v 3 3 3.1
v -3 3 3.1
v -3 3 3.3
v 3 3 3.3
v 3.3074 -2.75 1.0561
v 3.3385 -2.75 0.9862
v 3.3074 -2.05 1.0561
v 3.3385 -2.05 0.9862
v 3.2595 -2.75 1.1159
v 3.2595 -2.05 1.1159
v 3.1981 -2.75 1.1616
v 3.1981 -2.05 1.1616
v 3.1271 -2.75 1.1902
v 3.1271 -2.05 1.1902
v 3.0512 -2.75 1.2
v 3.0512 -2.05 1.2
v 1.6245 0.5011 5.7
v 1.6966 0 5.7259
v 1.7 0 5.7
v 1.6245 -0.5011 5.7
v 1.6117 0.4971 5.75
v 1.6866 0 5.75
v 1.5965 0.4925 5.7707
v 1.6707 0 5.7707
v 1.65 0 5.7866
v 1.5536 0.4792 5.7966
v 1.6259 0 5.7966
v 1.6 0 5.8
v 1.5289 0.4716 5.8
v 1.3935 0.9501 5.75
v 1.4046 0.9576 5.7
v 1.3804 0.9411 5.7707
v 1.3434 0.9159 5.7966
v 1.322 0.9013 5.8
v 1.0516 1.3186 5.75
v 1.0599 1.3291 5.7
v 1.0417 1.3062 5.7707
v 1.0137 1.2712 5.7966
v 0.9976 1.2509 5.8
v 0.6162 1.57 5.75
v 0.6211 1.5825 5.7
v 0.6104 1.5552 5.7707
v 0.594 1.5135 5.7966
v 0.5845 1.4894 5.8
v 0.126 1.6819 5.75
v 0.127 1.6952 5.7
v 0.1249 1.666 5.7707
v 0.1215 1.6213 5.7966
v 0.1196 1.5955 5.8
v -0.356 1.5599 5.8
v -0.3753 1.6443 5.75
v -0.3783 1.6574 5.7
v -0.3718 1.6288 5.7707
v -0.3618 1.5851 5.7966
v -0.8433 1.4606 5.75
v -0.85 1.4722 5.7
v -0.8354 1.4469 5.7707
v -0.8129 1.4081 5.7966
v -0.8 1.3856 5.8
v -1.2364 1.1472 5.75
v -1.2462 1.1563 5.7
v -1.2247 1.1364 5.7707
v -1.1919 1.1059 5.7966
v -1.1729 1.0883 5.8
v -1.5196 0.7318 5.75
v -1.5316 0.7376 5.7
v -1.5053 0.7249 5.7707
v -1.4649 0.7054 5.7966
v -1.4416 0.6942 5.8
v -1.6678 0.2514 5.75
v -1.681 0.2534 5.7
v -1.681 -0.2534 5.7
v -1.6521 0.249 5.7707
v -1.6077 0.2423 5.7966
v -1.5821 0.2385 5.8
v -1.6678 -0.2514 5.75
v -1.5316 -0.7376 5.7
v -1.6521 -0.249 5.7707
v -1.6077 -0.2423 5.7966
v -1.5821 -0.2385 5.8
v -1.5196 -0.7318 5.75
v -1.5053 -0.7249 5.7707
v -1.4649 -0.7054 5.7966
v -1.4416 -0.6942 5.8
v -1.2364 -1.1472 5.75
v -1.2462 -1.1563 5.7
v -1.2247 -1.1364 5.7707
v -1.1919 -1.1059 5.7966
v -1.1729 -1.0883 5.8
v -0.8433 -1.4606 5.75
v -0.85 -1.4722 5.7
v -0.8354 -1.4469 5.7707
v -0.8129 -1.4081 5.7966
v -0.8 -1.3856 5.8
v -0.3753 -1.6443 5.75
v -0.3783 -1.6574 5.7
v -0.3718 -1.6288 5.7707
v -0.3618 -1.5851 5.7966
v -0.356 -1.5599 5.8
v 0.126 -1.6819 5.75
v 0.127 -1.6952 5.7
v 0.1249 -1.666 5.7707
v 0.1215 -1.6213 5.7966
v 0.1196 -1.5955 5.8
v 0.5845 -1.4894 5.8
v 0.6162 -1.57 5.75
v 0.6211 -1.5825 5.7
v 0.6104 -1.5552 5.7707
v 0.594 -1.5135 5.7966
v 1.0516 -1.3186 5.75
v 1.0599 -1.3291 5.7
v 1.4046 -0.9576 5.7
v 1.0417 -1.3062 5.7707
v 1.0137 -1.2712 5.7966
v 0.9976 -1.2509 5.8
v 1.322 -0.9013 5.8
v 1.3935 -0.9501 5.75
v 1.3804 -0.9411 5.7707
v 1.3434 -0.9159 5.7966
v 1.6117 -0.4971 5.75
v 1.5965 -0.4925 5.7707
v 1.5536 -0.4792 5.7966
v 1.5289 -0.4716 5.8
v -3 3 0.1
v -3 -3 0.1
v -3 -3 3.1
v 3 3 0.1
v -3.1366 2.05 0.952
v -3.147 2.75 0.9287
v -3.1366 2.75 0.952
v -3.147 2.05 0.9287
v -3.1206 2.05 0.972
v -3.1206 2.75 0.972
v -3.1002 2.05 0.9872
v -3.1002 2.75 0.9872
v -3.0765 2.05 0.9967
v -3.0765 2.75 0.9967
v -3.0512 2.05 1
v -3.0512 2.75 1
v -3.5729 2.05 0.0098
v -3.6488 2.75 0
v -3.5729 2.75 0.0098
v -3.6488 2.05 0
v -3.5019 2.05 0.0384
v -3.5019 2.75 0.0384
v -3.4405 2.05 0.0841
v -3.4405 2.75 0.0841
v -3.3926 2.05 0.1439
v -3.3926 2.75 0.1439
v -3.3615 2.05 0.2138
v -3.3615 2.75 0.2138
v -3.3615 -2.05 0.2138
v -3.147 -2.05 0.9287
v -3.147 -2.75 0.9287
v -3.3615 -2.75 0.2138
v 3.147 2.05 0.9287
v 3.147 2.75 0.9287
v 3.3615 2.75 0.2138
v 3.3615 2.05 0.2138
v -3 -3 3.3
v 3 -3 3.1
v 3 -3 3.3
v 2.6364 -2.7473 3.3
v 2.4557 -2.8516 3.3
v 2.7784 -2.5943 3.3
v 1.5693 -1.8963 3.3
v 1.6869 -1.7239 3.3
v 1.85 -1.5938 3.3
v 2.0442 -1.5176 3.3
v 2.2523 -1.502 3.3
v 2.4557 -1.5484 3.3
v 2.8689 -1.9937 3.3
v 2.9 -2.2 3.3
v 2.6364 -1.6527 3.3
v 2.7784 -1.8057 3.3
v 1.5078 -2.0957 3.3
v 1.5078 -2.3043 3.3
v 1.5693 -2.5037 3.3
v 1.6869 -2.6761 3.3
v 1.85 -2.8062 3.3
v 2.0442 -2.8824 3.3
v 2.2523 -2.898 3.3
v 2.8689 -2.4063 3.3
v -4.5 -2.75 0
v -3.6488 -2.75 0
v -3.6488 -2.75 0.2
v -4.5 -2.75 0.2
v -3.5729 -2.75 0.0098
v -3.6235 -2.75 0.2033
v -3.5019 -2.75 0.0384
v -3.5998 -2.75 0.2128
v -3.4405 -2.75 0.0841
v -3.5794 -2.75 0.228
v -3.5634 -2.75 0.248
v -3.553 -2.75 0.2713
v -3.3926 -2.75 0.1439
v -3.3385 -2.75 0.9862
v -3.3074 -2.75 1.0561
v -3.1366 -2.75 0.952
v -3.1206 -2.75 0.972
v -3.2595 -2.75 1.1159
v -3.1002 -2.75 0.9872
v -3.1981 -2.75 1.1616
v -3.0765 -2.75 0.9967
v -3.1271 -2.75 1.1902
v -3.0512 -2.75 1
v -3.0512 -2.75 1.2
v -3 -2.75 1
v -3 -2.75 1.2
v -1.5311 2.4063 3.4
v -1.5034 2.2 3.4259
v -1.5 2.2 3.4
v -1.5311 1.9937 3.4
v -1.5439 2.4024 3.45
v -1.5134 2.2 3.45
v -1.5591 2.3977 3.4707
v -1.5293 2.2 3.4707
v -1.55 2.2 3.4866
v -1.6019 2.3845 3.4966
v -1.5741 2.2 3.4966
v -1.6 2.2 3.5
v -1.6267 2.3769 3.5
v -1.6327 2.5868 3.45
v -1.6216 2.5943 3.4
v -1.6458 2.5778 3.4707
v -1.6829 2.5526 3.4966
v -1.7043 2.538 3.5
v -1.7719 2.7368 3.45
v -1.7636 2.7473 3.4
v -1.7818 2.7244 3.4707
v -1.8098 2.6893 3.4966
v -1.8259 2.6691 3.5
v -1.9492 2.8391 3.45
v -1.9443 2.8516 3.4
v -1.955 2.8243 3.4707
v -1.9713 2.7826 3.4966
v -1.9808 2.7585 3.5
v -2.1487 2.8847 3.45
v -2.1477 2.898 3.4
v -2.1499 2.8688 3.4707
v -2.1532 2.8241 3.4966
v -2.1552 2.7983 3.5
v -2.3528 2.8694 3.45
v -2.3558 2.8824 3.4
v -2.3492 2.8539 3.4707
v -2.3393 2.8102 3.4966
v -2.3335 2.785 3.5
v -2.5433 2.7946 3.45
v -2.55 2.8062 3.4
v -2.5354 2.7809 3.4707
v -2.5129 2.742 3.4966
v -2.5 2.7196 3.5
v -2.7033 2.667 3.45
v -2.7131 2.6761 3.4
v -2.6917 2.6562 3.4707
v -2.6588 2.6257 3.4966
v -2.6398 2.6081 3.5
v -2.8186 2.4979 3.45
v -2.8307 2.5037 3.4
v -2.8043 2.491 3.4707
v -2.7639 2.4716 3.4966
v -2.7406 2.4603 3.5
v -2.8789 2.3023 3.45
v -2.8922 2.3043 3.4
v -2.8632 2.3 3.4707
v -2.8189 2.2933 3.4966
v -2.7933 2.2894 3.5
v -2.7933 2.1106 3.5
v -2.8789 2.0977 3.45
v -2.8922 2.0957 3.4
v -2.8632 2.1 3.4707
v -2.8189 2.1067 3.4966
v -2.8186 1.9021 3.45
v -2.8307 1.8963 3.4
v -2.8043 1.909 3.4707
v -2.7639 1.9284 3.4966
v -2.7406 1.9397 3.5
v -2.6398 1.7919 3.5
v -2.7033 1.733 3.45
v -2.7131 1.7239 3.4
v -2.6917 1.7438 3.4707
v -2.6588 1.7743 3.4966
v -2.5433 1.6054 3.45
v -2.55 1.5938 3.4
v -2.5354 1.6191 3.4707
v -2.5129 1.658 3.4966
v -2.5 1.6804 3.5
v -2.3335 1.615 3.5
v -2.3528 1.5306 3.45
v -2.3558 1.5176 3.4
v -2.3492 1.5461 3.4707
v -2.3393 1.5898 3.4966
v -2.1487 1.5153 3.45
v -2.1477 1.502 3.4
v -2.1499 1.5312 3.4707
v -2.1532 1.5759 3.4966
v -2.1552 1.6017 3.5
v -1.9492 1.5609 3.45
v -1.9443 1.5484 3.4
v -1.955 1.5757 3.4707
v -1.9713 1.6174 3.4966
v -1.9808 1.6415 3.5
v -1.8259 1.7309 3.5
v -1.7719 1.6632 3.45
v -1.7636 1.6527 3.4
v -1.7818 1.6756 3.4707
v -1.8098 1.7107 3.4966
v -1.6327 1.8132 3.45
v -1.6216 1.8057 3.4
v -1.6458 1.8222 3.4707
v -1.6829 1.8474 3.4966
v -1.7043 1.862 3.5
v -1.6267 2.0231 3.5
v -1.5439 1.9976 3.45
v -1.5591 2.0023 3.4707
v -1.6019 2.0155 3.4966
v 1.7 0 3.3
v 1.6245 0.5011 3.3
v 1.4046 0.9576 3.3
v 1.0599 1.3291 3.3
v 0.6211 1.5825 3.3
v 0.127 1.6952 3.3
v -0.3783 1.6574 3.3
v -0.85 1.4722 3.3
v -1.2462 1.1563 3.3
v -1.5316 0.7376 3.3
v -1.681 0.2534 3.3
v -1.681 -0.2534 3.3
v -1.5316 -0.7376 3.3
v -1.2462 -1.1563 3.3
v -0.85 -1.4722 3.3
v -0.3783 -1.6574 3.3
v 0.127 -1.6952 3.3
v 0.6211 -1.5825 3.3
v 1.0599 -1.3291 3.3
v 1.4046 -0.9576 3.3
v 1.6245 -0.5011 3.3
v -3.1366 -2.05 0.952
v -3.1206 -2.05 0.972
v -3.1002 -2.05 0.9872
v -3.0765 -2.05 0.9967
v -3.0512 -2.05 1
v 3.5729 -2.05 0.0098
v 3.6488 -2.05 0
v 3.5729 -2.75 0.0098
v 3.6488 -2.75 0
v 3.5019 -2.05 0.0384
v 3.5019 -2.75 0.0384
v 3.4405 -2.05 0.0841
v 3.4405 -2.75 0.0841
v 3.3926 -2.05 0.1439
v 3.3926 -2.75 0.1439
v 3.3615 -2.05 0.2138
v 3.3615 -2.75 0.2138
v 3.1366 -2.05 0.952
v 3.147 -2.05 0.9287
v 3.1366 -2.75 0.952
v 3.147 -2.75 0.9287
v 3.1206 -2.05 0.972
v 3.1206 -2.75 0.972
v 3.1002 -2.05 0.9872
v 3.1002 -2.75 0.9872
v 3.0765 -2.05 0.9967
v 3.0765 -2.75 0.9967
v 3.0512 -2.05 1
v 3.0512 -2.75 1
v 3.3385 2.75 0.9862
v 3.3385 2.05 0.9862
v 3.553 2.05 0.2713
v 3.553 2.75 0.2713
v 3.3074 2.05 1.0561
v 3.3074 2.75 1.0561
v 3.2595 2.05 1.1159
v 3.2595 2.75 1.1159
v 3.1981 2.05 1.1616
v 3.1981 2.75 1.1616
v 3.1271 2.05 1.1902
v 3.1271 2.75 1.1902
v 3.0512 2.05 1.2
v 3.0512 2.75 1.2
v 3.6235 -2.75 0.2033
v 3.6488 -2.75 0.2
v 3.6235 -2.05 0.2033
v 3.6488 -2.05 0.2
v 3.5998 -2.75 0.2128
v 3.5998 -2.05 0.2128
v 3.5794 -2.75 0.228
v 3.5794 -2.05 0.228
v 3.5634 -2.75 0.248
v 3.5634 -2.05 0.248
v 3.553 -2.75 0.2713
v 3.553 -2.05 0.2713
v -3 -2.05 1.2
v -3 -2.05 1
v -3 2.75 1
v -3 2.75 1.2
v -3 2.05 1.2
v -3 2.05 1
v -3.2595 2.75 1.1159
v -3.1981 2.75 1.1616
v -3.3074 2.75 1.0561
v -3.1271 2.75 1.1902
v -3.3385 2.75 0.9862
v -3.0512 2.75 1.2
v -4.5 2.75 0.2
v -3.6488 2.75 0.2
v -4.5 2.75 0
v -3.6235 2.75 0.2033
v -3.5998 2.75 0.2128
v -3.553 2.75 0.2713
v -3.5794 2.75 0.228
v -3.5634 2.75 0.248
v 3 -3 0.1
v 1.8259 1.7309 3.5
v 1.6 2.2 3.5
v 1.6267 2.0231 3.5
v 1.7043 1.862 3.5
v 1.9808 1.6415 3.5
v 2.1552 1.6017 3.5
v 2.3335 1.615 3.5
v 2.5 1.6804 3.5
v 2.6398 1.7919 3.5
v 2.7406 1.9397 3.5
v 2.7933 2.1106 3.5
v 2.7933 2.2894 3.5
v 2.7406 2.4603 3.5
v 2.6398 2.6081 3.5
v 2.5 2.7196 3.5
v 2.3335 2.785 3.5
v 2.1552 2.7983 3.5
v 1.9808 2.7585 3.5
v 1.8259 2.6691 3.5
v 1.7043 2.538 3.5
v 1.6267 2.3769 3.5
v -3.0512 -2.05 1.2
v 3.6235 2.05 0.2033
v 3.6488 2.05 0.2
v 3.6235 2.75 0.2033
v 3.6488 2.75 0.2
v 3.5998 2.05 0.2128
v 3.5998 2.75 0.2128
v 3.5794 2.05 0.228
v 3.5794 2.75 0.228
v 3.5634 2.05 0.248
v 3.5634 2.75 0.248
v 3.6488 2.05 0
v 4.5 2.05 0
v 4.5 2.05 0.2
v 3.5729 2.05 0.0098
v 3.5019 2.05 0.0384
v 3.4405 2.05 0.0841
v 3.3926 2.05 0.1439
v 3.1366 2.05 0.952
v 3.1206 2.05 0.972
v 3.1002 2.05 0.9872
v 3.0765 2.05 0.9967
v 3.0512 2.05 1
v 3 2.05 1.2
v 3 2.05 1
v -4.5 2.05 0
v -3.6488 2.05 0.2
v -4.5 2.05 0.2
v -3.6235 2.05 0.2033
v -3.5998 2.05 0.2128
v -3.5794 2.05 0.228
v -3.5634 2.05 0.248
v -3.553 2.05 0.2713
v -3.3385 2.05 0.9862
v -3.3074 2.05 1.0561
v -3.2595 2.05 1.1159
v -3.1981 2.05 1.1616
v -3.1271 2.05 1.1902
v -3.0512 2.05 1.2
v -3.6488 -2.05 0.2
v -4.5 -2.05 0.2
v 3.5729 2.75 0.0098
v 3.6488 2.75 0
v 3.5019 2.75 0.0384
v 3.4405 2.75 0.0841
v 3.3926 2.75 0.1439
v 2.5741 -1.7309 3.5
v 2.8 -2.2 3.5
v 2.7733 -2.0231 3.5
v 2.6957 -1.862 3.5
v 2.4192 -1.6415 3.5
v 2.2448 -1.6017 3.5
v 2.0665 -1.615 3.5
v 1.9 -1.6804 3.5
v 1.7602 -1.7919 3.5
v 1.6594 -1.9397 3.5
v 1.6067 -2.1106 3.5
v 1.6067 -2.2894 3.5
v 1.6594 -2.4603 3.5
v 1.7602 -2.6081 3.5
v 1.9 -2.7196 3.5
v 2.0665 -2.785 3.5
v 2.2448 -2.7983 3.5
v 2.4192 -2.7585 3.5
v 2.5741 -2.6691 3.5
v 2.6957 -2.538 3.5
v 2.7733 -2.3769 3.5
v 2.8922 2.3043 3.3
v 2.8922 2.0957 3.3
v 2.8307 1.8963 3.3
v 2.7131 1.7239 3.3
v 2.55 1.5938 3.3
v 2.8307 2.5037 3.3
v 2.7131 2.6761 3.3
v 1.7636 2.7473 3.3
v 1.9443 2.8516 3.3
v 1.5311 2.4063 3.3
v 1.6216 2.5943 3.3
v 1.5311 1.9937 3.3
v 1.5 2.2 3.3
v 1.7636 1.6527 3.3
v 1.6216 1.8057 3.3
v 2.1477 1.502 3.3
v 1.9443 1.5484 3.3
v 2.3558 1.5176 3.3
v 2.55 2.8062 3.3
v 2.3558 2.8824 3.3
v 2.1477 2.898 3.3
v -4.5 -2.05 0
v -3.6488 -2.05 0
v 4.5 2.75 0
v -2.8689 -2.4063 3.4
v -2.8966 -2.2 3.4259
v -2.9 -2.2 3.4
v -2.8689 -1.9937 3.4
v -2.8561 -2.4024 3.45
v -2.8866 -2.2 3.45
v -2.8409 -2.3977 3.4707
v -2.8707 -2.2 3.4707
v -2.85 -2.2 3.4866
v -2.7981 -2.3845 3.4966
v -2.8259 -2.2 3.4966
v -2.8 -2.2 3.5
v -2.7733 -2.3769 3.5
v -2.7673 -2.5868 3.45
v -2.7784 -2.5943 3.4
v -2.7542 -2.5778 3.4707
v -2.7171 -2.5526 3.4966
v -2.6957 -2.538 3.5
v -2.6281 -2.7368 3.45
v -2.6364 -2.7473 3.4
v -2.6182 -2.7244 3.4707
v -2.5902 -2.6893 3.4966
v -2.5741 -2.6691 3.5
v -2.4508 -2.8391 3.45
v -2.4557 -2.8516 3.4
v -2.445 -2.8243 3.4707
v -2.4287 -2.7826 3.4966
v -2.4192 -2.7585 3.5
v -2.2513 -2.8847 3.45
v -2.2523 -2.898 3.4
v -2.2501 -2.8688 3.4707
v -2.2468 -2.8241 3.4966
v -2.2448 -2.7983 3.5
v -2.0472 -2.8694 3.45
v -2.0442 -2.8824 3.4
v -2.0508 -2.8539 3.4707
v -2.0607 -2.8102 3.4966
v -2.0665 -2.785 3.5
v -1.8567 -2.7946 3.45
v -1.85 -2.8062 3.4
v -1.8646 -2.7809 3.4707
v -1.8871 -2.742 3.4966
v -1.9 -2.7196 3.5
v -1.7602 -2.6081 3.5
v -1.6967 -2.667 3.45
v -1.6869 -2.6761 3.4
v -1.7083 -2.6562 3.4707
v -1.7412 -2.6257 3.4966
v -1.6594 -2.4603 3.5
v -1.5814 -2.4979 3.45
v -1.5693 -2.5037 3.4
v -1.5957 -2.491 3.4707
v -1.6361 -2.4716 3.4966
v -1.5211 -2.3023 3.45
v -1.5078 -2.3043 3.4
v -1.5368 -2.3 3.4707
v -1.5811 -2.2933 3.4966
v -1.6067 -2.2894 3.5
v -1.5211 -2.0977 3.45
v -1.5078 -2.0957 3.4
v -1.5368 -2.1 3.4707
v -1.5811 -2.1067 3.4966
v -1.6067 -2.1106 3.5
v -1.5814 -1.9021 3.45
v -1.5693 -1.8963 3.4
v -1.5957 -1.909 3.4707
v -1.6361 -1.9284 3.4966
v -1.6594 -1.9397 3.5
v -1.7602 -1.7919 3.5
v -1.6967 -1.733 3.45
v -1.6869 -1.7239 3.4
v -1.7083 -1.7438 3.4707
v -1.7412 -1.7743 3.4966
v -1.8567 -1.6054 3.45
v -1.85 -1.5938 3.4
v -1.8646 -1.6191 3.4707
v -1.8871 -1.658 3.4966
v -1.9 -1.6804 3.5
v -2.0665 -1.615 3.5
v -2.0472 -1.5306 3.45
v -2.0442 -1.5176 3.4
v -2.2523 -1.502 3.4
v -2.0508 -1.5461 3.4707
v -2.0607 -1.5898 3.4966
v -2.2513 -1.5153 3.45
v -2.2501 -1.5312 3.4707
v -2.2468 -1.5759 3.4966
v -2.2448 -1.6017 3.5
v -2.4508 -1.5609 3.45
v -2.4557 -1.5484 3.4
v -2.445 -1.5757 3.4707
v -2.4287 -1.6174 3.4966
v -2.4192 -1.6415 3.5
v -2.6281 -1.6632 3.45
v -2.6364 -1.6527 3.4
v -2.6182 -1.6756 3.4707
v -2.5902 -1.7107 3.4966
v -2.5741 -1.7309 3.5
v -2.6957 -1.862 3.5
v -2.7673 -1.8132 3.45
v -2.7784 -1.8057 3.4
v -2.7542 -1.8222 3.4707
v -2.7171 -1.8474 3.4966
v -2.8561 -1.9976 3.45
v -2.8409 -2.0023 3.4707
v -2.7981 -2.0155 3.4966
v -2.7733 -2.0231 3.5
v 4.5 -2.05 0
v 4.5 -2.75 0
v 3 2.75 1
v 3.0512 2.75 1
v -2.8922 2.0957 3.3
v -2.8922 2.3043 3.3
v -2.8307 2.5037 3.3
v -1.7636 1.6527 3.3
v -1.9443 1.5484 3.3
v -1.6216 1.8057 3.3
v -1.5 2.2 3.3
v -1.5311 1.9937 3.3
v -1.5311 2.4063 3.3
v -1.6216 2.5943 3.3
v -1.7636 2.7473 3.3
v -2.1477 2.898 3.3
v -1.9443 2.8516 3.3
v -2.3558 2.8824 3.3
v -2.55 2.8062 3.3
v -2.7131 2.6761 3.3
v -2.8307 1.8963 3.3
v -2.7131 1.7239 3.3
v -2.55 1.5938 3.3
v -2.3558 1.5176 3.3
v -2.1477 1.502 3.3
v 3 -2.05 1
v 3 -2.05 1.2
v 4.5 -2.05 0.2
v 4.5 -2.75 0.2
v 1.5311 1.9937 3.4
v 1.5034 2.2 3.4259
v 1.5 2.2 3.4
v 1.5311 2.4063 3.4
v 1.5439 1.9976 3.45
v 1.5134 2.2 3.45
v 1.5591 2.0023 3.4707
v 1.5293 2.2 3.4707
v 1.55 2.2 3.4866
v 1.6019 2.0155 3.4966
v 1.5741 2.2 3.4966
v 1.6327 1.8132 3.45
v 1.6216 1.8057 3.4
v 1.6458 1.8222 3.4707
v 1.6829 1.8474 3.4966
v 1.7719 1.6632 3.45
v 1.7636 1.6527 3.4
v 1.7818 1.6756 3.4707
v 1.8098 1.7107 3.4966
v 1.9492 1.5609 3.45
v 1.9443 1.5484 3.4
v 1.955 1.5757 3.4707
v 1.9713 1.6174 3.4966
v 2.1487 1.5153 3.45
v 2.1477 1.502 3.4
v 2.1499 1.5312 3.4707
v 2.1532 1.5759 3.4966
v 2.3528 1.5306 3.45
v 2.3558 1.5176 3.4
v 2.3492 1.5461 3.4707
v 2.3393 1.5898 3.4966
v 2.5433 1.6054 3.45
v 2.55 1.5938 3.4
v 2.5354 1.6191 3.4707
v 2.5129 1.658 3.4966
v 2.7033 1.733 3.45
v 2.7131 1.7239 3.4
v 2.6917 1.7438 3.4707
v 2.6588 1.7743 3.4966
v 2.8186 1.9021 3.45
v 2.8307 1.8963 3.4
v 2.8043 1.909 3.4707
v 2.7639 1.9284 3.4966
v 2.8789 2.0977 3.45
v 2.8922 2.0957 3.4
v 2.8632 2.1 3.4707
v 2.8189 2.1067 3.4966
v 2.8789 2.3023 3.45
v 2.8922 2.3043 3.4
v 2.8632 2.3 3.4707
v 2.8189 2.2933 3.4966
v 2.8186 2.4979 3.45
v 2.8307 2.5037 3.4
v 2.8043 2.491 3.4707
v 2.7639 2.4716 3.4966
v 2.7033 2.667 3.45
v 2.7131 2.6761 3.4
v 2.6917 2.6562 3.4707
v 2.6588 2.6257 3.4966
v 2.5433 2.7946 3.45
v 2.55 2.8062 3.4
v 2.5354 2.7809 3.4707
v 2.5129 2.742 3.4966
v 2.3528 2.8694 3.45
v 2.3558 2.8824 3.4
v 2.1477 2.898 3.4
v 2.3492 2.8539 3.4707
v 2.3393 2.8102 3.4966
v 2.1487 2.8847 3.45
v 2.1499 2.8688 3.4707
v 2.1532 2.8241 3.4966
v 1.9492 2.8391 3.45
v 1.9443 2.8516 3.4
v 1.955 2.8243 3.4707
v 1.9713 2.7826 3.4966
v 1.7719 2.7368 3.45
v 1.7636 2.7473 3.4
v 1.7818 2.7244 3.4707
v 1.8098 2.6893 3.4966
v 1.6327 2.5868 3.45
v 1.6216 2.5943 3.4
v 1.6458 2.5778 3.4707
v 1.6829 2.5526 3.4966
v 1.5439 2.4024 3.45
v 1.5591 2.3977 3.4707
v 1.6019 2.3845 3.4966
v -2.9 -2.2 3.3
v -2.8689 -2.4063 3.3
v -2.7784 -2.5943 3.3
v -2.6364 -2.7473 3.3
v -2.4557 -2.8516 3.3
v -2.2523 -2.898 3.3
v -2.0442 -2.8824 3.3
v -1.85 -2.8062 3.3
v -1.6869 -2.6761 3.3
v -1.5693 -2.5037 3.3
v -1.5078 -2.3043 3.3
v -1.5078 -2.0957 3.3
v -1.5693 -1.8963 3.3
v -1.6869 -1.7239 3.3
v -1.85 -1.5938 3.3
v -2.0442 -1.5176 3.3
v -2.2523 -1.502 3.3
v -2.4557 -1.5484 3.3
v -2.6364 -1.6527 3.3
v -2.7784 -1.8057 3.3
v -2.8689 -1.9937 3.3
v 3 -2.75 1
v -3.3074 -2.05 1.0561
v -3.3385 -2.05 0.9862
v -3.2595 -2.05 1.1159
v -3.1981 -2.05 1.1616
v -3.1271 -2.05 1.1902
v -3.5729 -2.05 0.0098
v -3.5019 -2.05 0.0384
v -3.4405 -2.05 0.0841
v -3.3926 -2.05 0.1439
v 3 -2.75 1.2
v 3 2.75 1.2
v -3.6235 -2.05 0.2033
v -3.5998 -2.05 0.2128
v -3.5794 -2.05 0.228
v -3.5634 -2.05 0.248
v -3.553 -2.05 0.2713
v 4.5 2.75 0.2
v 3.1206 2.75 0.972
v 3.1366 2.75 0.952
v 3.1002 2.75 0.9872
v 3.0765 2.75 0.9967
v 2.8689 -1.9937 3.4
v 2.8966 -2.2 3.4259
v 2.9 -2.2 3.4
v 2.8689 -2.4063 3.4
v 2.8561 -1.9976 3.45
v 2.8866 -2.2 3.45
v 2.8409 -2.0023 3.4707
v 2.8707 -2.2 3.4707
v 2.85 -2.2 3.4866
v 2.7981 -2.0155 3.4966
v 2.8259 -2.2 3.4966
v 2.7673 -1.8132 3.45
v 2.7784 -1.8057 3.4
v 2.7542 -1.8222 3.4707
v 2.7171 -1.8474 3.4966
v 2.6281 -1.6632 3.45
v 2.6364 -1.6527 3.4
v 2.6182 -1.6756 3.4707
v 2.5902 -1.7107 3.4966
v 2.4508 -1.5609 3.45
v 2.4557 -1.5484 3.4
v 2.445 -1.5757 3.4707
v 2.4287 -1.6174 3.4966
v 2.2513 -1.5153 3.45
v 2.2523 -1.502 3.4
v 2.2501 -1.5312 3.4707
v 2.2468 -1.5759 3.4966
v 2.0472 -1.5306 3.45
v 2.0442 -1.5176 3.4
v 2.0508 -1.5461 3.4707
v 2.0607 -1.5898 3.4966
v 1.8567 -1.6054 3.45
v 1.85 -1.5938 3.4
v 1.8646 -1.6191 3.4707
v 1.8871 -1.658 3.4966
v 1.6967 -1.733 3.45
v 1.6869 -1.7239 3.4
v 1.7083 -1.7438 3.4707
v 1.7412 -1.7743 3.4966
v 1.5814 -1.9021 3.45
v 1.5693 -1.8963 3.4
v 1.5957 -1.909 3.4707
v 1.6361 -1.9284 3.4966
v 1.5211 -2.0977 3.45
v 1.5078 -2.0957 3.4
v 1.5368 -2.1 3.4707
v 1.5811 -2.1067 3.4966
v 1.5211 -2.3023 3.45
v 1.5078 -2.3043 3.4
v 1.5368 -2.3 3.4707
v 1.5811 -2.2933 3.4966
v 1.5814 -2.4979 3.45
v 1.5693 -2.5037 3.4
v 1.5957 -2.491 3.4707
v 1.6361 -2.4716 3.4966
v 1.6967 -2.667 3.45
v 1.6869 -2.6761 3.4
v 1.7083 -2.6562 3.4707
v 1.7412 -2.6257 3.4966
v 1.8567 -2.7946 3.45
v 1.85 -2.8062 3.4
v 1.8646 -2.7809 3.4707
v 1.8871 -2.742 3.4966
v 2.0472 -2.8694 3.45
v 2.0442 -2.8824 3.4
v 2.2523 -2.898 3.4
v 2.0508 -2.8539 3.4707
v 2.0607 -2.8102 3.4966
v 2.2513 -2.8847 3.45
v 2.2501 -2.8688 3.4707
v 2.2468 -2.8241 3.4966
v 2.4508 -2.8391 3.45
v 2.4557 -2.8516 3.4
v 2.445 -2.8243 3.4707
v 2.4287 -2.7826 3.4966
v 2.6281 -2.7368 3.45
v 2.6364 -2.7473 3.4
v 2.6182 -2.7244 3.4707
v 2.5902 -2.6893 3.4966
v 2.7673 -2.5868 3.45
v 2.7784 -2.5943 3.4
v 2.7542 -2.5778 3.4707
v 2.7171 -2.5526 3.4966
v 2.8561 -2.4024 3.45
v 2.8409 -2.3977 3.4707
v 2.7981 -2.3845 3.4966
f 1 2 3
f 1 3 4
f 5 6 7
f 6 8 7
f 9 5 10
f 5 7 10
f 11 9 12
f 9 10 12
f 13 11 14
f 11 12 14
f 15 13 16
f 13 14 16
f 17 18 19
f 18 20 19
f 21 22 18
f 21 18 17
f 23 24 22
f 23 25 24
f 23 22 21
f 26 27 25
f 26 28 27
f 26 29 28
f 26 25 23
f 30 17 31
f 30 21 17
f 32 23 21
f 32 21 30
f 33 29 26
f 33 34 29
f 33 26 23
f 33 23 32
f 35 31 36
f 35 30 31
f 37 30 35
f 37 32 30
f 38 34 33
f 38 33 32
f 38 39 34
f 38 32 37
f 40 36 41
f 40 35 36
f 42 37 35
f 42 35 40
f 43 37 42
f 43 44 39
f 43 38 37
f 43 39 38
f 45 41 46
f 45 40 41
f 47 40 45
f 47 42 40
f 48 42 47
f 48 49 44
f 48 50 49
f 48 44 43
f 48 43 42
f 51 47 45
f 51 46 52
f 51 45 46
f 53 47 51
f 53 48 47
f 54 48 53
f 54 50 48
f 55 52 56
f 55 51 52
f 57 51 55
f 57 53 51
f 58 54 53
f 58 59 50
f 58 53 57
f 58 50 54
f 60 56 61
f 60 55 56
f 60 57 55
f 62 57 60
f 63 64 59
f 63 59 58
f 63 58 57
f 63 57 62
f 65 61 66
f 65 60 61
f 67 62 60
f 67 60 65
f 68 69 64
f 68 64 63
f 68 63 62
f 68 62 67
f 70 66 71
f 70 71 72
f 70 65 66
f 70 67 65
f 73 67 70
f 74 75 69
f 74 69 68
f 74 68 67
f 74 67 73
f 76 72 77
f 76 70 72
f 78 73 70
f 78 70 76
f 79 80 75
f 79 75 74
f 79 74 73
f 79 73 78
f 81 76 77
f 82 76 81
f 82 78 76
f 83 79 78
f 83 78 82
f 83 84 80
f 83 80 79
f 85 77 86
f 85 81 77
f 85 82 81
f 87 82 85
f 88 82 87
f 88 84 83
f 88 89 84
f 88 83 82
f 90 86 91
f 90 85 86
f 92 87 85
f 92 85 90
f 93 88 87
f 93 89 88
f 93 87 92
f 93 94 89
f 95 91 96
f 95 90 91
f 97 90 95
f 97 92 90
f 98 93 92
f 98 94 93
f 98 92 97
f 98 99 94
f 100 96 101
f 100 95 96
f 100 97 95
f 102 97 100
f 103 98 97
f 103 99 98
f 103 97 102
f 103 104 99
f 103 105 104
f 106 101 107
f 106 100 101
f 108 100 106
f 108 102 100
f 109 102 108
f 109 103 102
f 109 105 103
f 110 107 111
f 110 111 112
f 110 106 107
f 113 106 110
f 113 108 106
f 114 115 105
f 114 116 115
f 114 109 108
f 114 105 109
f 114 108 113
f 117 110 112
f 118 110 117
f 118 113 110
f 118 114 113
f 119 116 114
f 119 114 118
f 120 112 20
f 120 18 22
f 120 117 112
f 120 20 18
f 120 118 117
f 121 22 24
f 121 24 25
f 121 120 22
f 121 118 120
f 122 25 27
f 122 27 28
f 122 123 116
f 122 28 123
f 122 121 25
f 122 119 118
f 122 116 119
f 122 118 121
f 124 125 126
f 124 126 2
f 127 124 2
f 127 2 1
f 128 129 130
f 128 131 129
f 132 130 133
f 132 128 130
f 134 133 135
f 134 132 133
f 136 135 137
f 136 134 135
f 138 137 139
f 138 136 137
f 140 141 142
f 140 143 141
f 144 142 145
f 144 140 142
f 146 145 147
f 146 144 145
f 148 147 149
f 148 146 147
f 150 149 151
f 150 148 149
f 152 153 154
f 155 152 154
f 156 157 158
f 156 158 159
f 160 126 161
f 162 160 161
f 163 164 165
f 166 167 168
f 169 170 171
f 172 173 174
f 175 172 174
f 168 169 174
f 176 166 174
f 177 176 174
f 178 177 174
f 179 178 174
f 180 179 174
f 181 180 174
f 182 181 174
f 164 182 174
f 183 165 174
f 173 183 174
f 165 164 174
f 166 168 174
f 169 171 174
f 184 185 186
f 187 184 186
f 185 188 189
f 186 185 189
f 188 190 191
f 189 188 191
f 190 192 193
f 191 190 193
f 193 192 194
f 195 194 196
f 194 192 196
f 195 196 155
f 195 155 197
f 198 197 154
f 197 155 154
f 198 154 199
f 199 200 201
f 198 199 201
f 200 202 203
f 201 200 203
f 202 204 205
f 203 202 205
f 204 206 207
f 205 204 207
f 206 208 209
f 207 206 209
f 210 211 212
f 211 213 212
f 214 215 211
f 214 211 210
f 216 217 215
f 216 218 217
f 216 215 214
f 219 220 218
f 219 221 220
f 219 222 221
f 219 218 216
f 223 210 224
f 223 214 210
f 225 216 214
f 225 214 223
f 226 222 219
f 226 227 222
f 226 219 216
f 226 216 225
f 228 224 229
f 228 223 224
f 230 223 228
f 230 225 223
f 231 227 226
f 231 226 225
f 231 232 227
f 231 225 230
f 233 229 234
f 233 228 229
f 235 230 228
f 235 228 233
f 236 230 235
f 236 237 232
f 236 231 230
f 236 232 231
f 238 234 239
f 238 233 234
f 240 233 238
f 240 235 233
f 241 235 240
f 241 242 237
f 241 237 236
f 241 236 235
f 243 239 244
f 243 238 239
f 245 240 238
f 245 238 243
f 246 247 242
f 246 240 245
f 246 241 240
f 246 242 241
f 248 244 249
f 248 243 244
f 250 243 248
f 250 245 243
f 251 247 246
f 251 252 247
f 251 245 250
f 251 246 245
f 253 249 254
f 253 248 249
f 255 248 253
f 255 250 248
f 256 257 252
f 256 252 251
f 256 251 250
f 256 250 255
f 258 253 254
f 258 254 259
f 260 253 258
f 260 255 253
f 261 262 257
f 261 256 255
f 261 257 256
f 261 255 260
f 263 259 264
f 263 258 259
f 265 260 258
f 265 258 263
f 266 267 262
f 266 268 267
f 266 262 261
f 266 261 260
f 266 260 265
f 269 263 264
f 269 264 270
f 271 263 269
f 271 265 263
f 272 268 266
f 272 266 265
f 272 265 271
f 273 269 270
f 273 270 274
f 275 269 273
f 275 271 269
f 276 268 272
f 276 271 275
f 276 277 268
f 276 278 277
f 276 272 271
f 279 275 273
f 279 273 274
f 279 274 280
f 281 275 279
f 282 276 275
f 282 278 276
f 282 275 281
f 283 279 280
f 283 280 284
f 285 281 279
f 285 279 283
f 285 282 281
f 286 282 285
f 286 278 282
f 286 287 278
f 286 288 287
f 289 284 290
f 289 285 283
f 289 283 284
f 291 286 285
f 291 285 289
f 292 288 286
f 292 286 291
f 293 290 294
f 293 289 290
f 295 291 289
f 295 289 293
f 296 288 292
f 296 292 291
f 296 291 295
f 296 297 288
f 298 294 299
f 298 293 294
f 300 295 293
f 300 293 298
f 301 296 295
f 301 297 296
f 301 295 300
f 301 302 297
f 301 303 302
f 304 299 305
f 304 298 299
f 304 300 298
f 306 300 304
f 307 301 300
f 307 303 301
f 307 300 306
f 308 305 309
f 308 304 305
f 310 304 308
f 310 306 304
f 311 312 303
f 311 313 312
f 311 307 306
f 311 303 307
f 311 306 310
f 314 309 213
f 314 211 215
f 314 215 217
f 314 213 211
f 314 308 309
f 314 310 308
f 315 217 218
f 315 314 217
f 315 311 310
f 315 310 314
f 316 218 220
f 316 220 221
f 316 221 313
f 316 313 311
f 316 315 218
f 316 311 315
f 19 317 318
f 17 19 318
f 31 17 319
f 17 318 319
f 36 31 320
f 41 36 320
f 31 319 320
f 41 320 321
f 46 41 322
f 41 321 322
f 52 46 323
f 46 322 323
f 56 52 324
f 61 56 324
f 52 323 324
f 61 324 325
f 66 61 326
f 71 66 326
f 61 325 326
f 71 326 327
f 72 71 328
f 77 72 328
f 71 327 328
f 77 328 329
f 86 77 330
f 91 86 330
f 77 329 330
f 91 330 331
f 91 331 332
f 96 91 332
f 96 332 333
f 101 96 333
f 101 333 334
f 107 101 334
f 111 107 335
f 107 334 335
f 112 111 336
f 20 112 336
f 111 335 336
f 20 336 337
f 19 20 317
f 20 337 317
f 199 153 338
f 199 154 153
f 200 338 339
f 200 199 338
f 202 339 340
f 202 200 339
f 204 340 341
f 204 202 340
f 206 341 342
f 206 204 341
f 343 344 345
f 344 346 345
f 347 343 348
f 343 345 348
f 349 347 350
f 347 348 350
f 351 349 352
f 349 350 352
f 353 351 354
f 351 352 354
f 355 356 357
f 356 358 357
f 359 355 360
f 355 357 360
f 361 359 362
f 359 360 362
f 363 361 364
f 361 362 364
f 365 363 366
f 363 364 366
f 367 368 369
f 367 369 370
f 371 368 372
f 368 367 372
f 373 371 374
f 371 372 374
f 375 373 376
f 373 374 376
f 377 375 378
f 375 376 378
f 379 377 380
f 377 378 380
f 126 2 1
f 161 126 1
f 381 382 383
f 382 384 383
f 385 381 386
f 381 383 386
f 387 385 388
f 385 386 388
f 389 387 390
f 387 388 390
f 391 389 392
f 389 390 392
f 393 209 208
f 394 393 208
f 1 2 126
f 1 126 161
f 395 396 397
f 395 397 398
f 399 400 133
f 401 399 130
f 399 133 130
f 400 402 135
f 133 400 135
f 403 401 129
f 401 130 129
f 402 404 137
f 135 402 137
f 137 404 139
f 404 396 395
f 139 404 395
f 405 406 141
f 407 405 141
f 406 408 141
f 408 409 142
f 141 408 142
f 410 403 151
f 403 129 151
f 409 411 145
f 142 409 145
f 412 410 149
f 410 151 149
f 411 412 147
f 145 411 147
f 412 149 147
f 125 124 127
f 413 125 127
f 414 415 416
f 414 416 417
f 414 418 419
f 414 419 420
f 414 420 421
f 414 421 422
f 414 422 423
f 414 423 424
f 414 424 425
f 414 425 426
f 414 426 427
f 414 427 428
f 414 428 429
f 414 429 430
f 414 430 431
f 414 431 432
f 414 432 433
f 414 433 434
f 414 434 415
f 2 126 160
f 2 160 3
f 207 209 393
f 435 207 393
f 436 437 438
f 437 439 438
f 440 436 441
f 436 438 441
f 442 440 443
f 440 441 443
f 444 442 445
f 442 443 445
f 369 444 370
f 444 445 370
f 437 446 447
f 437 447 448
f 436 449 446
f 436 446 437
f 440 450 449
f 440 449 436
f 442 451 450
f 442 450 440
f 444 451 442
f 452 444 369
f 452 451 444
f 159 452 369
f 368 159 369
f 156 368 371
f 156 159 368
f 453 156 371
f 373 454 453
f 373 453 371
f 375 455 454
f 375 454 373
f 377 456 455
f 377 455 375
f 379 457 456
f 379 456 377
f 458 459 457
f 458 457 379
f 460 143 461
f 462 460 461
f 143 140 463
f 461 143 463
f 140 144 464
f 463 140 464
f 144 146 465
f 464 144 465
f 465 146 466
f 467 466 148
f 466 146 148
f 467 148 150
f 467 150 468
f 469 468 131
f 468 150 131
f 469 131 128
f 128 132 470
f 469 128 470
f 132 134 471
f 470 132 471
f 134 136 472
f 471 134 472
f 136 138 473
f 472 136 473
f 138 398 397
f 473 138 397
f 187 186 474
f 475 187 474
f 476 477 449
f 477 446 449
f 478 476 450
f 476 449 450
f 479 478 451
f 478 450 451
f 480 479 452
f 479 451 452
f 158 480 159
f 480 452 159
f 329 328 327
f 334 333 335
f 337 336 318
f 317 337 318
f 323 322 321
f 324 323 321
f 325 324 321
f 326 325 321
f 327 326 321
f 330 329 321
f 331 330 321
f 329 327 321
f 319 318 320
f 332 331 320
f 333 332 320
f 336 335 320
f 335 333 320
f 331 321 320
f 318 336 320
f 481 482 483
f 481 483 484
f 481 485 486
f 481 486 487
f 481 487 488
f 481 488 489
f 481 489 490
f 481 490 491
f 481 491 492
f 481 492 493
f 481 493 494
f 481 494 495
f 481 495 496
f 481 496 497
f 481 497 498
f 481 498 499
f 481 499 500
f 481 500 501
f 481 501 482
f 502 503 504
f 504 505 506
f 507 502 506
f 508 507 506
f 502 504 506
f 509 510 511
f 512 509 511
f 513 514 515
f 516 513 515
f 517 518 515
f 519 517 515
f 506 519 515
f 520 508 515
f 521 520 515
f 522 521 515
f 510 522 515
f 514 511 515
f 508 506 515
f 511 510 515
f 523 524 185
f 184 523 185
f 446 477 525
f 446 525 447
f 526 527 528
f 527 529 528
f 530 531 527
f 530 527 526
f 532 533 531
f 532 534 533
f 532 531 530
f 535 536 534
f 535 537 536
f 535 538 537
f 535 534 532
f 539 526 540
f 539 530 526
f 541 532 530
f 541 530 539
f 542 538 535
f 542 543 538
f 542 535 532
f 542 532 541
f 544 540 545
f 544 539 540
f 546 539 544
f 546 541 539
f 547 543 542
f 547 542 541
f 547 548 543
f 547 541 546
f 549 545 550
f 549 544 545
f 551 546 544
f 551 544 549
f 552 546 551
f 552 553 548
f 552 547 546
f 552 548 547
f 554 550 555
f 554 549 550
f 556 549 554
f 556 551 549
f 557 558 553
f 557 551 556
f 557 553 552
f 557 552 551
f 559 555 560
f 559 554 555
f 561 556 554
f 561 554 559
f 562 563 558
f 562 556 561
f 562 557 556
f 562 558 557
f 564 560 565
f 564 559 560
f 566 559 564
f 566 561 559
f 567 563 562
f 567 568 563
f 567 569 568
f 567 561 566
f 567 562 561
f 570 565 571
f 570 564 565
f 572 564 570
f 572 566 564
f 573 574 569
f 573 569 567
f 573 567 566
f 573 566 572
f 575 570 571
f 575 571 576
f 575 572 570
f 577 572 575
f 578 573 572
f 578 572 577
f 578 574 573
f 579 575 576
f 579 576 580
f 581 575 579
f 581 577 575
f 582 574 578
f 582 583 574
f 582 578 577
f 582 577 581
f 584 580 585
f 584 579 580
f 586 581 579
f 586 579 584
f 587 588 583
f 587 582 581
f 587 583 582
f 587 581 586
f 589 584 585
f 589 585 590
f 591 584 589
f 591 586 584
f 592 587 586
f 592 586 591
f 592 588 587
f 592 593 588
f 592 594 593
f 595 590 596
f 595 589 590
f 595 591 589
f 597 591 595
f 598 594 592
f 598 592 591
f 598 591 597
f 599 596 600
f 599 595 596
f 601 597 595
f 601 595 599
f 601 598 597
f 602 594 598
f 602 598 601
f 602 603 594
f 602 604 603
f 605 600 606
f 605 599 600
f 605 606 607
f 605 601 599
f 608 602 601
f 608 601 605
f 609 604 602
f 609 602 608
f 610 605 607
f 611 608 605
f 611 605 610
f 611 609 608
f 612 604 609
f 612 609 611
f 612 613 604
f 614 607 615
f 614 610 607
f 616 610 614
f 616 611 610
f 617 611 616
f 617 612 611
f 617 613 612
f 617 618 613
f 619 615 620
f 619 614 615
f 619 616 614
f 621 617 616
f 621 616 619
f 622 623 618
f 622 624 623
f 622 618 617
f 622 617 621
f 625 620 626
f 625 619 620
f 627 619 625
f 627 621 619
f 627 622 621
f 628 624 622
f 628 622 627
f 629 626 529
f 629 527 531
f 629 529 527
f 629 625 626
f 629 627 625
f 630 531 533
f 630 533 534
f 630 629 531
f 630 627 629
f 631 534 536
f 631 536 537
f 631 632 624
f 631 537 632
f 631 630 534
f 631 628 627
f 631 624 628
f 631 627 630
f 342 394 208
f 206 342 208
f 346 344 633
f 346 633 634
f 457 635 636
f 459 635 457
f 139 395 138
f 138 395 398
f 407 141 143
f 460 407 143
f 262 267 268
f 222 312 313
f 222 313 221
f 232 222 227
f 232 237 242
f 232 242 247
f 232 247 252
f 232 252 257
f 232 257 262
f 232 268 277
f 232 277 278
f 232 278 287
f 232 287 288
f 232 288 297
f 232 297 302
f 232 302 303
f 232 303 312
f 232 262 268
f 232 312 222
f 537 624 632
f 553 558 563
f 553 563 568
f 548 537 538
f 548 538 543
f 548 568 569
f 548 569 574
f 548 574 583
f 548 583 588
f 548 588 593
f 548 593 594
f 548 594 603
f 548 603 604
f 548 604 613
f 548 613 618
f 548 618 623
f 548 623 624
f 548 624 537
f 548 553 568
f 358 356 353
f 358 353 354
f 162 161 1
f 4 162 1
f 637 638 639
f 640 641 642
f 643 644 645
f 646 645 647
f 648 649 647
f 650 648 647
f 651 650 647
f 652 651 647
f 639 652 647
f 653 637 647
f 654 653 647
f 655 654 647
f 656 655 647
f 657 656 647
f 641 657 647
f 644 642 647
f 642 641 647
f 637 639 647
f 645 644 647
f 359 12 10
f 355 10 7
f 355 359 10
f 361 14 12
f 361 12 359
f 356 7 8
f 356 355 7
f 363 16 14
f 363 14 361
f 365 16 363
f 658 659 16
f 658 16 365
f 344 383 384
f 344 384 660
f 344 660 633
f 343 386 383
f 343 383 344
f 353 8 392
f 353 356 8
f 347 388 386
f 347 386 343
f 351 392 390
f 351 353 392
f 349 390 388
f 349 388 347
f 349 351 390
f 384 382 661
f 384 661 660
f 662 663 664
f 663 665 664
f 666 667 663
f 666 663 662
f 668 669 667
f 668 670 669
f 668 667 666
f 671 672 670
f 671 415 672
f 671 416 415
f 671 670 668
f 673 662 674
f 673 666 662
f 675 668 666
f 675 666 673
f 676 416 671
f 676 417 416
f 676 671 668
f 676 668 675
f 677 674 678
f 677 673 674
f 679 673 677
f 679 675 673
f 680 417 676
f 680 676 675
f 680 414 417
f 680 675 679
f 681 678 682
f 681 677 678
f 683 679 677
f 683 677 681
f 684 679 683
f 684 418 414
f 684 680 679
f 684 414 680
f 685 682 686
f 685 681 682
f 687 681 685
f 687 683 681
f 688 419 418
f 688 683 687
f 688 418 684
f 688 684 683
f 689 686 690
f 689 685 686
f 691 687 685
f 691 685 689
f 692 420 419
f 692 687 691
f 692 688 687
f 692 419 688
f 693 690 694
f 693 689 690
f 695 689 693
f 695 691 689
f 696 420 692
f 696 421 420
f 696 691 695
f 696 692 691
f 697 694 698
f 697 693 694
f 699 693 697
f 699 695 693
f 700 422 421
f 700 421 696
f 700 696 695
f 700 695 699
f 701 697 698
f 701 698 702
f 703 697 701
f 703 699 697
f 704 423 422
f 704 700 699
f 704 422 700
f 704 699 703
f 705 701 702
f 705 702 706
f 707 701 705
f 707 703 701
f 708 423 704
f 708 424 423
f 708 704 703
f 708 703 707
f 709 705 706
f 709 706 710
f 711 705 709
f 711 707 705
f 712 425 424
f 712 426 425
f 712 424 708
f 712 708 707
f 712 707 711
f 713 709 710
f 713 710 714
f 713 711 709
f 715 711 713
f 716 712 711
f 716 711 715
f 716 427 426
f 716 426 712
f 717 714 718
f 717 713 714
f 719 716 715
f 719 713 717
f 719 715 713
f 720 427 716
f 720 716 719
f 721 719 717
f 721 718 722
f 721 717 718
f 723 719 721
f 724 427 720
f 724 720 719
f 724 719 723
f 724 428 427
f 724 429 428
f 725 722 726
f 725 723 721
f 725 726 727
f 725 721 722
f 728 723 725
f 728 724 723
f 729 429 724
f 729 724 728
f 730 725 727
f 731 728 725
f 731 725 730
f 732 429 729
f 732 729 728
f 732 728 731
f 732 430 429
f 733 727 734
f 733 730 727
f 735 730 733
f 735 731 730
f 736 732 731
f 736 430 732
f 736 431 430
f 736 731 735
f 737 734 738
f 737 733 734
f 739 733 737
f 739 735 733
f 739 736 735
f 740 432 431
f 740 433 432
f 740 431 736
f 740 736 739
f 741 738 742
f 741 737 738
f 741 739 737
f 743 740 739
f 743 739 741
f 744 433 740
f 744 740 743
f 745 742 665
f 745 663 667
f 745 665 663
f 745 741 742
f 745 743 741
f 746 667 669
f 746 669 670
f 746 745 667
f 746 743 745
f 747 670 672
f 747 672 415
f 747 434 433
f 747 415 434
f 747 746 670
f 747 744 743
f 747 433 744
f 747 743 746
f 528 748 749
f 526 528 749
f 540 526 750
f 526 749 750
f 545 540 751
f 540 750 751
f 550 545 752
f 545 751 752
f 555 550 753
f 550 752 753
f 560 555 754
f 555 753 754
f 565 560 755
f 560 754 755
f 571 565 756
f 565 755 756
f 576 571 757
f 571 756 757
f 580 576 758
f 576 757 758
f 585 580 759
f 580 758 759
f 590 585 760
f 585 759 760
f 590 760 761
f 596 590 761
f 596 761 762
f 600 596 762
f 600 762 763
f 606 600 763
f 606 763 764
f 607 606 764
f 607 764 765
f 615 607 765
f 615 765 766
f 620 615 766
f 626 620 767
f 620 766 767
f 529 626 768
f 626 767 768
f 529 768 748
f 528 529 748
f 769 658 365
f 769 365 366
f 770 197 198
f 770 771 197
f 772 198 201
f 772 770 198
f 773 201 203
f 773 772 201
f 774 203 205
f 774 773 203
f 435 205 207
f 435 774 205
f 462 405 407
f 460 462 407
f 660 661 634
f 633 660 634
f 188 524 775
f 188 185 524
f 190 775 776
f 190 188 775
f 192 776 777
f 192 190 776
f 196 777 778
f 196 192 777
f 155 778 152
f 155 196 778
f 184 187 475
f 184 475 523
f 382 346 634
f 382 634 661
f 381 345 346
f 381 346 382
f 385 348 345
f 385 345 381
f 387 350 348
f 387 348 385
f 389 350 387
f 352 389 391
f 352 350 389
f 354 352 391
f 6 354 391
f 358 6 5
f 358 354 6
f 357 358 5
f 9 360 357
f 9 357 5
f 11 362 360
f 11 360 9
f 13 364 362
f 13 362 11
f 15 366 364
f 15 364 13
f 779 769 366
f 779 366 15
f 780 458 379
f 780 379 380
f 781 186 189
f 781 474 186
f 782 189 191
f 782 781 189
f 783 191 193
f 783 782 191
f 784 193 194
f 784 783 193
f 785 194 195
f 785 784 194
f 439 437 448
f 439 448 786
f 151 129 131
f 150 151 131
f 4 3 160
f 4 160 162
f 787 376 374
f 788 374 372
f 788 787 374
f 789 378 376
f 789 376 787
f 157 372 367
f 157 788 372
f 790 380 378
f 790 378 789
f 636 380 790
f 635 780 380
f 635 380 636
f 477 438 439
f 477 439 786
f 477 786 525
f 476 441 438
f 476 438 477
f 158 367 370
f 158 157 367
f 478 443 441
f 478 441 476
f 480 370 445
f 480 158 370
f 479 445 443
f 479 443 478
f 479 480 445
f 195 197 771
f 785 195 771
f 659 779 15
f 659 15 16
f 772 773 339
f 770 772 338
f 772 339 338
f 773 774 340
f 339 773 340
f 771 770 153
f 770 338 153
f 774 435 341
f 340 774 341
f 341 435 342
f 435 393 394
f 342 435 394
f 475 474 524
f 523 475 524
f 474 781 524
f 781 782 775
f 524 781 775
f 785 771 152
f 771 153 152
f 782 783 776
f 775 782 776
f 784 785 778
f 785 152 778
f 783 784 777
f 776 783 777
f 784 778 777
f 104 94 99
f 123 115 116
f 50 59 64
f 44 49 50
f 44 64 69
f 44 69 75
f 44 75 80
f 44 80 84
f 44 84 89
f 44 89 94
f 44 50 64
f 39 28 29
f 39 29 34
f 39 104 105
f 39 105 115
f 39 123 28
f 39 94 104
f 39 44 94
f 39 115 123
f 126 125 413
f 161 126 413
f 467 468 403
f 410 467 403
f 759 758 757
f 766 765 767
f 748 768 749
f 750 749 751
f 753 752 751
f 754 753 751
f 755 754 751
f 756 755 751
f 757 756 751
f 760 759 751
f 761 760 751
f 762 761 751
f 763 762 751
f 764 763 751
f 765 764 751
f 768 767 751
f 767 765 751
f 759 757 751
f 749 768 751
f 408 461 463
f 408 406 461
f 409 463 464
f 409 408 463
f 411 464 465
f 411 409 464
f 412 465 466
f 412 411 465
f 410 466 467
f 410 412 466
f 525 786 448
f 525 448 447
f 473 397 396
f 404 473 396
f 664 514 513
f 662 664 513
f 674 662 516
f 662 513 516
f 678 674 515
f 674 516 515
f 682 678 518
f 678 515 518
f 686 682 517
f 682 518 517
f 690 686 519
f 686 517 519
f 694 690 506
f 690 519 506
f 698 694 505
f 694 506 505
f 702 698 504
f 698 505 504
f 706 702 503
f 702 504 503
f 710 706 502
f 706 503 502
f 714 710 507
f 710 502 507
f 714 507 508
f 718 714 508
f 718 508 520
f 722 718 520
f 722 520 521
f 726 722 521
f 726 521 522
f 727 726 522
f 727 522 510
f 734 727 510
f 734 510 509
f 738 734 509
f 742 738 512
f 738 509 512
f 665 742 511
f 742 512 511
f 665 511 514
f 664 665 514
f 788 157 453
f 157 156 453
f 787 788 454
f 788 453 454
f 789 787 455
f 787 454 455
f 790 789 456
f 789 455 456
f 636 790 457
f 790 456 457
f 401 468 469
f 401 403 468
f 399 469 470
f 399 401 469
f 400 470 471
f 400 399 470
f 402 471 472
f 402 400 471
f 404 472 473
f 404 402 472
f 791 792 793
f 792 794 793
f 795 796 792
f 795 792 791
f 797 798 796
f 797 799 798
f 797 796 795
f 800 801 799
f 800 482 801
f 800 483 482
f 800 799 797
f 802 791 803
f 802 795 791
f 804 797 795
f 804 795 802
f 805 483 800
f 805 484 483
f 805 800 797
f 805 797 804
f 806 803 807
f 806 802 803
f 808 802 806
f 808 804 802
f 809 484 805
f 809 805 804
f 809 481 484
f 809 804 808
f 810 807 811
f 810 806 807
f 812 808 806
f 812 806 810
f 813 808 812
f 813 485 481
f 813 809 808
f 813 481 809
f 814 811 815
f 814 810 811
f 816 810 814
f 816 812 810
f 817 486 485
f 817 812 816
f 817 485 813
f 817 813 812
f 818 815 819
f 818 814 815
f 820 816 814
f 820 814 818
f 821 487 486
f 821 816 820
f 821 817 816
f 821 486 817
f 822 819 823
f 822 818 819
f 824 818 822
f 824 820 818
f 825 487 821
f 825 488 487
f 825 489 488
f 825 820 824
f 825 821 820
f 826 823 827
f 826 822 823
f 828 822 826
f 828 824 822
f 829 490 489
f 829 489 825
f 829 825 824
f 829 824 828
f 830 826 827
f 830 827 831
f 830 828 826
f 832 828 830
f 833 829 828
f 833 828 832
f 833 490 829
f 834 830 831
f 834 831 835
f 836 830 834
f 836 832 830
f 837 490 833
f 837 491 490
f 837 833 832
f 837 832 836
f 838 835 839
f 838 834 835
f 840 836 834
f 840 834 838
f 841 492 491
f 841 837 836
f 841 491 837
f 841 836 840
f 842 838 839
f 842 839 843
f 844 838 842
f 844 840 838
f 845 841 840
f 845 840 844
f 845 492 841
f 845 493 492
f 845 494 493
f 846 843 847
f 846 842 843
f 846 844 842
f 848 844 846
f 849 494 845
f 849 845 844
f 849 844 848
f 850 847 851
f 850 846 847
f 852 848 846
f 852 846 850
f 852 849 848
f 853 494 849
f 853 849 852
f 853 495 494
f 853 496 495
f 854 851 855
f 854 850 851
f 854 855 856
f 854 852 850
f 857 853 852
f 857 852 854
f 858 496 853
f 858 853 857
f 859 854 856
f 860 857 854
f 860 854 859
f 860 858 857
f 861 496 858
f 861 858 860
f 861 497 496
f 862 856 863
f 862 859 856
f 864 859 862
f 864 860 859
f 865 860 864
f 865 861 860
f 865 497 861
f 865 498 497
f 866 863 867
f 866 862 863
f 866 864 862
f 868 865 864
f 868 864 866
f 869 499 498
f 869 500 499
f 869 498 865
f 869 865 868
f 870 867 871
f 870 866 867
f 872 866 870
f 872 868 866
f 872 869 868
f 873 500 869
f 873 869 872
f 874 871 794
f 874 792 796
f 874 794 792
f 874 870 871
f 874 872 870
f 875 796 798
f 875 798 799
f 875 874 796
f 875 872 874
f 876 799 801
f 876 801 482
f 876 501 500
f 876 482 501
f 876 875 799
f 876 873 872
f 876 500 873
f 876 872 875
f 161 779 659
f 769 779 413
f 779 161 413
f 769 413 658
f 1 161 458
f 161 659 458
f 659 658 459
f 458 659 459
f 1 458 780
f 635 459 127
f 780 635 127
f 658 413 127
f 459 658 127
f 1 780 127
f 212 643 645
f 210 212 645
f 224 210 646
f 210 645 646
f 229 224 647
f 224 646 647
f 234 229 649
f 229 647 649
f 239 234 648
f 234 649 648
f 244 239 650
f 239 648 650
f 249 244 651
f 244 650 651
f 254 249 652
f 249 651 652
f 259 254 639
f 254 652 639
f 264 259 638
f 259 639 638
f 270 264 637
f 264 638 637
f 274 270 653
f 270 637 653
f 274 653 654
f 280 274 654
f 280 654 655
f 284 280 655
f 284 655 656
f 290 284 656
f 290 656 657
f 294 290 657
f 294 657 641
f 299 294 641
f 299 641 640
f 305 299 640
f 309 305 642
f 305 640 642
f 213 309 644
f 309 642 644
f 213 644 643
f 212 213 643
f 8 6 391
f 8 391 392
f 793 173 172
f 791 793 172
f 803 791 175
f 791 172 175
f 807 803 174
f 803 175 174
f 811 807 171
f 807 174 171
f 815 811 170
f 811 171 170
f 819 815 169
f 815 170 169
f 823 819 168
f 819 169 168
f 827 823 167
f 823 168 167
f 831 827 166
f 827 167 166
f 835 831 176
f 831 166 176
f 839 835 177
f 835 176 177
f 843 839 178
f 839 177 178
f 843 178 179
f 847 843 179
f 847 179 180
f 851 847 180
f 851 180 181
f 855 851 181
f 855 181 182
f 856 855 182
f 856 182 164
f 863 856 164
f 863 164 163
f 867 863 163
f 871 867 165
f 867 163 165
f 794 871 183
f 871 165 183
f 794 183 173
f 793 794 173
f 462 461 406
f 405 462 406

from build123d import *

# Parameters (mm, degrees)
SKETCH_2_W        = 6
SKETCH_2_H        = 6
EXTRUDE_1_DEPTH   = 3
SKETCH_3_W        = 6
SKETCH_3_H        = 6
EXTRUDE_3_DEPTH   = 0.2
SKETCH_4_R        = 0.7
EXTRUDE_4_DEPTH   = 0.2
EXTRUDE_4_2_DEPTH = 0.2
EXTRUDE_4_3_DEPTH = 0.2
EXTRUDE_4_4_DEPTH = 0.2
FILLET_1_R        = 0.1
FILLET_2_R        = 0.1
FILLET_3_R        = 0.1
FILLET_4_R        = 0.1
SKETCH_5_R        = 1.7
EXTRUDE_5_DEPTH   = 2.5
FILLET_5_R        = 0.1
SKETCH_6_W        = 0.2
SKETCH_6_H        = 0.7


with BuildPart() as part:
    # 草图2 → 凸台-拉伸1 (new body)
    with BuildSketch(Plane.XY.offset(0.1)):
        Rectangle(SKETCH_2_W, SKETCH_2_H)
    extrude(amount=EXTRUDE_1_DEPTH)


with BuildPart() as body_2:
    # 草图3 → 凸台-拉伸3 (new body)
    with BuildSketch(Plane.XY.offset(3.1)):
        Rectangle(SKETCH_3_W, SKETCH_3_H)
    extrude(amount=EXTRUDE_3_DEPTH)


with BuildPart() as body_3:
    # 草图4 → 凸台-拉伸4 (new body)
    with BuildSketch(Plane.XY.offset(3.3)):
        with Locations((-2.2, 2.2)):
            Circle(SKETCH_4_R)
    extrude(amount=EXTRUDE_4_DEPTH)

    # 圆角2
    fillet_2_edges = [body_3.edges().sort_by_distance(p)[0] for p in [
        (-2.9, 2.2, 3.5),
    ]]
    fillet(fillet_2_edges, radius=FILLET_2_R)


with BuildPart() as body_4:
    # 草图4 → Extrude 4 2 (new body)
    with BuildSketch(Plane.XY.offset(3.3)):
        with Locations(Location((2.2, 2.2, 0), (0, 0, 180))):
            Circle(SKETCH_4_R)
    extrude(amount=EXTRUDE_4_2_DEPTH)

    # 圆角3
    fillet_3_edges = [body_4.edges().sort_by_distance(p)[0] for p in [
        (2.9, 2.2, 3.5),
    ]]
    fillet(fillet_3_edges, radius=FILLET_3_R)


with BuildPart() as body_5:
    # 草图4 → Extrude 4 3 (new body)
    with BuildSketch(Plane.XY.offset(3.3)):
        with Locations((2.2, -2.2)):
            Circle(SKETCH_4_R)
    extrude(amount=EXTRUDE_4_3_DEPTH)

    # 圆角4
    fillet_4_edges = [body_5.edges().sort_by_distance(p)[0] for p in [
        (1.5, -2.2, 3.5),
    ]]
    fillet(fillet_4_edges, radius=FILLET_4_R)


with BuildPart() as body_6:
    # 草图4 → Extrude 4 4 (new body)
    with BuildSketch(Plane.XY.offset(3.3)):
        with Locations(Location((-2.2, -2.2, 0), (0, 0, 180))):
            Circle(SKETCH_4_R)
    extrude(amount=EXTRUDE_4_4_DEPTH)

    # 圆角1
    fillet_1_edges = [body_6.edges().sort_by_distance(p)[0] for p in [
        (-1.5, -2.2, 3.5),
    ]]
    fillet(fillet_1_edges, radius=FILLET_1_R)


with BuildPart() as body_7:
    # 草图5 → 凸台-拉伸5 (new body)
    with BuildSketch(Plane.XY.offset(3.3)):
        Circle(SKETCH_5_R)
    extrude(amount=EXTRUDE_5_DEPTH)

    # 圆角5
    fillet_5_edges = [body_7.edges().sort_by_distance(p)[0] for p in [
        (-1.7, 0, 5.8),
    ]]
    fillet(fillet_5_edges, radius=FILLET_5_R)


with BuildPart() as body_8:
    # 扫描1: sweep along a path in 草图7
    with BuildLine(Plane(origin=(0, -2.4, 0), x_dir=(1, 0, 0), z_dir=(0, 1, 0))) as sweep_1_path:
        Line((-4.5, -0.1), (-3.64880613, -0.1))
        ThreePointArc((-3.64880613, -0.1), (-3.529420024, -0.139541414), (-3.457240873, -0.242530423))
        Line((-3.457240873, -0.242530423), (-3.242759127, -0.957469577))
        ThreePointArc((-3.242759127, -0.957469577), (-3.170579976, -1.060458586), (-3.05119387, -1.1))
        Line((-3.05119387, -1.1), (-3, -1.1))
    # 草图6 → 扫描1 (sweep)
    with BuildSketch(Plane.ZY.offset(3)):
        with Locations((1.1, -2.4)):
            Rectangle(SKETCH_6_W, SKETCH_6_H)
        with Locations((1.1, 2.4)):
            Rectangle(SKETCH_6_W, SKETCH_6_H)
    sweep_1 = sweep(path=sweep_1_path.line)


with BuildPart() as part_1:
    add(part.part)

    # 镜向1: 扫描1 across plane
    add(sweep_1.mirror(Plane(origin=(0, 0, 0), x_dir=(0, 0, 1), z_dir=(1, 0, 0))))


solid = Compound([body_2.part, body_3.part, body_4.part, body_5.part, body_6.part, body_7.part, body_8.part, part_1.part])
